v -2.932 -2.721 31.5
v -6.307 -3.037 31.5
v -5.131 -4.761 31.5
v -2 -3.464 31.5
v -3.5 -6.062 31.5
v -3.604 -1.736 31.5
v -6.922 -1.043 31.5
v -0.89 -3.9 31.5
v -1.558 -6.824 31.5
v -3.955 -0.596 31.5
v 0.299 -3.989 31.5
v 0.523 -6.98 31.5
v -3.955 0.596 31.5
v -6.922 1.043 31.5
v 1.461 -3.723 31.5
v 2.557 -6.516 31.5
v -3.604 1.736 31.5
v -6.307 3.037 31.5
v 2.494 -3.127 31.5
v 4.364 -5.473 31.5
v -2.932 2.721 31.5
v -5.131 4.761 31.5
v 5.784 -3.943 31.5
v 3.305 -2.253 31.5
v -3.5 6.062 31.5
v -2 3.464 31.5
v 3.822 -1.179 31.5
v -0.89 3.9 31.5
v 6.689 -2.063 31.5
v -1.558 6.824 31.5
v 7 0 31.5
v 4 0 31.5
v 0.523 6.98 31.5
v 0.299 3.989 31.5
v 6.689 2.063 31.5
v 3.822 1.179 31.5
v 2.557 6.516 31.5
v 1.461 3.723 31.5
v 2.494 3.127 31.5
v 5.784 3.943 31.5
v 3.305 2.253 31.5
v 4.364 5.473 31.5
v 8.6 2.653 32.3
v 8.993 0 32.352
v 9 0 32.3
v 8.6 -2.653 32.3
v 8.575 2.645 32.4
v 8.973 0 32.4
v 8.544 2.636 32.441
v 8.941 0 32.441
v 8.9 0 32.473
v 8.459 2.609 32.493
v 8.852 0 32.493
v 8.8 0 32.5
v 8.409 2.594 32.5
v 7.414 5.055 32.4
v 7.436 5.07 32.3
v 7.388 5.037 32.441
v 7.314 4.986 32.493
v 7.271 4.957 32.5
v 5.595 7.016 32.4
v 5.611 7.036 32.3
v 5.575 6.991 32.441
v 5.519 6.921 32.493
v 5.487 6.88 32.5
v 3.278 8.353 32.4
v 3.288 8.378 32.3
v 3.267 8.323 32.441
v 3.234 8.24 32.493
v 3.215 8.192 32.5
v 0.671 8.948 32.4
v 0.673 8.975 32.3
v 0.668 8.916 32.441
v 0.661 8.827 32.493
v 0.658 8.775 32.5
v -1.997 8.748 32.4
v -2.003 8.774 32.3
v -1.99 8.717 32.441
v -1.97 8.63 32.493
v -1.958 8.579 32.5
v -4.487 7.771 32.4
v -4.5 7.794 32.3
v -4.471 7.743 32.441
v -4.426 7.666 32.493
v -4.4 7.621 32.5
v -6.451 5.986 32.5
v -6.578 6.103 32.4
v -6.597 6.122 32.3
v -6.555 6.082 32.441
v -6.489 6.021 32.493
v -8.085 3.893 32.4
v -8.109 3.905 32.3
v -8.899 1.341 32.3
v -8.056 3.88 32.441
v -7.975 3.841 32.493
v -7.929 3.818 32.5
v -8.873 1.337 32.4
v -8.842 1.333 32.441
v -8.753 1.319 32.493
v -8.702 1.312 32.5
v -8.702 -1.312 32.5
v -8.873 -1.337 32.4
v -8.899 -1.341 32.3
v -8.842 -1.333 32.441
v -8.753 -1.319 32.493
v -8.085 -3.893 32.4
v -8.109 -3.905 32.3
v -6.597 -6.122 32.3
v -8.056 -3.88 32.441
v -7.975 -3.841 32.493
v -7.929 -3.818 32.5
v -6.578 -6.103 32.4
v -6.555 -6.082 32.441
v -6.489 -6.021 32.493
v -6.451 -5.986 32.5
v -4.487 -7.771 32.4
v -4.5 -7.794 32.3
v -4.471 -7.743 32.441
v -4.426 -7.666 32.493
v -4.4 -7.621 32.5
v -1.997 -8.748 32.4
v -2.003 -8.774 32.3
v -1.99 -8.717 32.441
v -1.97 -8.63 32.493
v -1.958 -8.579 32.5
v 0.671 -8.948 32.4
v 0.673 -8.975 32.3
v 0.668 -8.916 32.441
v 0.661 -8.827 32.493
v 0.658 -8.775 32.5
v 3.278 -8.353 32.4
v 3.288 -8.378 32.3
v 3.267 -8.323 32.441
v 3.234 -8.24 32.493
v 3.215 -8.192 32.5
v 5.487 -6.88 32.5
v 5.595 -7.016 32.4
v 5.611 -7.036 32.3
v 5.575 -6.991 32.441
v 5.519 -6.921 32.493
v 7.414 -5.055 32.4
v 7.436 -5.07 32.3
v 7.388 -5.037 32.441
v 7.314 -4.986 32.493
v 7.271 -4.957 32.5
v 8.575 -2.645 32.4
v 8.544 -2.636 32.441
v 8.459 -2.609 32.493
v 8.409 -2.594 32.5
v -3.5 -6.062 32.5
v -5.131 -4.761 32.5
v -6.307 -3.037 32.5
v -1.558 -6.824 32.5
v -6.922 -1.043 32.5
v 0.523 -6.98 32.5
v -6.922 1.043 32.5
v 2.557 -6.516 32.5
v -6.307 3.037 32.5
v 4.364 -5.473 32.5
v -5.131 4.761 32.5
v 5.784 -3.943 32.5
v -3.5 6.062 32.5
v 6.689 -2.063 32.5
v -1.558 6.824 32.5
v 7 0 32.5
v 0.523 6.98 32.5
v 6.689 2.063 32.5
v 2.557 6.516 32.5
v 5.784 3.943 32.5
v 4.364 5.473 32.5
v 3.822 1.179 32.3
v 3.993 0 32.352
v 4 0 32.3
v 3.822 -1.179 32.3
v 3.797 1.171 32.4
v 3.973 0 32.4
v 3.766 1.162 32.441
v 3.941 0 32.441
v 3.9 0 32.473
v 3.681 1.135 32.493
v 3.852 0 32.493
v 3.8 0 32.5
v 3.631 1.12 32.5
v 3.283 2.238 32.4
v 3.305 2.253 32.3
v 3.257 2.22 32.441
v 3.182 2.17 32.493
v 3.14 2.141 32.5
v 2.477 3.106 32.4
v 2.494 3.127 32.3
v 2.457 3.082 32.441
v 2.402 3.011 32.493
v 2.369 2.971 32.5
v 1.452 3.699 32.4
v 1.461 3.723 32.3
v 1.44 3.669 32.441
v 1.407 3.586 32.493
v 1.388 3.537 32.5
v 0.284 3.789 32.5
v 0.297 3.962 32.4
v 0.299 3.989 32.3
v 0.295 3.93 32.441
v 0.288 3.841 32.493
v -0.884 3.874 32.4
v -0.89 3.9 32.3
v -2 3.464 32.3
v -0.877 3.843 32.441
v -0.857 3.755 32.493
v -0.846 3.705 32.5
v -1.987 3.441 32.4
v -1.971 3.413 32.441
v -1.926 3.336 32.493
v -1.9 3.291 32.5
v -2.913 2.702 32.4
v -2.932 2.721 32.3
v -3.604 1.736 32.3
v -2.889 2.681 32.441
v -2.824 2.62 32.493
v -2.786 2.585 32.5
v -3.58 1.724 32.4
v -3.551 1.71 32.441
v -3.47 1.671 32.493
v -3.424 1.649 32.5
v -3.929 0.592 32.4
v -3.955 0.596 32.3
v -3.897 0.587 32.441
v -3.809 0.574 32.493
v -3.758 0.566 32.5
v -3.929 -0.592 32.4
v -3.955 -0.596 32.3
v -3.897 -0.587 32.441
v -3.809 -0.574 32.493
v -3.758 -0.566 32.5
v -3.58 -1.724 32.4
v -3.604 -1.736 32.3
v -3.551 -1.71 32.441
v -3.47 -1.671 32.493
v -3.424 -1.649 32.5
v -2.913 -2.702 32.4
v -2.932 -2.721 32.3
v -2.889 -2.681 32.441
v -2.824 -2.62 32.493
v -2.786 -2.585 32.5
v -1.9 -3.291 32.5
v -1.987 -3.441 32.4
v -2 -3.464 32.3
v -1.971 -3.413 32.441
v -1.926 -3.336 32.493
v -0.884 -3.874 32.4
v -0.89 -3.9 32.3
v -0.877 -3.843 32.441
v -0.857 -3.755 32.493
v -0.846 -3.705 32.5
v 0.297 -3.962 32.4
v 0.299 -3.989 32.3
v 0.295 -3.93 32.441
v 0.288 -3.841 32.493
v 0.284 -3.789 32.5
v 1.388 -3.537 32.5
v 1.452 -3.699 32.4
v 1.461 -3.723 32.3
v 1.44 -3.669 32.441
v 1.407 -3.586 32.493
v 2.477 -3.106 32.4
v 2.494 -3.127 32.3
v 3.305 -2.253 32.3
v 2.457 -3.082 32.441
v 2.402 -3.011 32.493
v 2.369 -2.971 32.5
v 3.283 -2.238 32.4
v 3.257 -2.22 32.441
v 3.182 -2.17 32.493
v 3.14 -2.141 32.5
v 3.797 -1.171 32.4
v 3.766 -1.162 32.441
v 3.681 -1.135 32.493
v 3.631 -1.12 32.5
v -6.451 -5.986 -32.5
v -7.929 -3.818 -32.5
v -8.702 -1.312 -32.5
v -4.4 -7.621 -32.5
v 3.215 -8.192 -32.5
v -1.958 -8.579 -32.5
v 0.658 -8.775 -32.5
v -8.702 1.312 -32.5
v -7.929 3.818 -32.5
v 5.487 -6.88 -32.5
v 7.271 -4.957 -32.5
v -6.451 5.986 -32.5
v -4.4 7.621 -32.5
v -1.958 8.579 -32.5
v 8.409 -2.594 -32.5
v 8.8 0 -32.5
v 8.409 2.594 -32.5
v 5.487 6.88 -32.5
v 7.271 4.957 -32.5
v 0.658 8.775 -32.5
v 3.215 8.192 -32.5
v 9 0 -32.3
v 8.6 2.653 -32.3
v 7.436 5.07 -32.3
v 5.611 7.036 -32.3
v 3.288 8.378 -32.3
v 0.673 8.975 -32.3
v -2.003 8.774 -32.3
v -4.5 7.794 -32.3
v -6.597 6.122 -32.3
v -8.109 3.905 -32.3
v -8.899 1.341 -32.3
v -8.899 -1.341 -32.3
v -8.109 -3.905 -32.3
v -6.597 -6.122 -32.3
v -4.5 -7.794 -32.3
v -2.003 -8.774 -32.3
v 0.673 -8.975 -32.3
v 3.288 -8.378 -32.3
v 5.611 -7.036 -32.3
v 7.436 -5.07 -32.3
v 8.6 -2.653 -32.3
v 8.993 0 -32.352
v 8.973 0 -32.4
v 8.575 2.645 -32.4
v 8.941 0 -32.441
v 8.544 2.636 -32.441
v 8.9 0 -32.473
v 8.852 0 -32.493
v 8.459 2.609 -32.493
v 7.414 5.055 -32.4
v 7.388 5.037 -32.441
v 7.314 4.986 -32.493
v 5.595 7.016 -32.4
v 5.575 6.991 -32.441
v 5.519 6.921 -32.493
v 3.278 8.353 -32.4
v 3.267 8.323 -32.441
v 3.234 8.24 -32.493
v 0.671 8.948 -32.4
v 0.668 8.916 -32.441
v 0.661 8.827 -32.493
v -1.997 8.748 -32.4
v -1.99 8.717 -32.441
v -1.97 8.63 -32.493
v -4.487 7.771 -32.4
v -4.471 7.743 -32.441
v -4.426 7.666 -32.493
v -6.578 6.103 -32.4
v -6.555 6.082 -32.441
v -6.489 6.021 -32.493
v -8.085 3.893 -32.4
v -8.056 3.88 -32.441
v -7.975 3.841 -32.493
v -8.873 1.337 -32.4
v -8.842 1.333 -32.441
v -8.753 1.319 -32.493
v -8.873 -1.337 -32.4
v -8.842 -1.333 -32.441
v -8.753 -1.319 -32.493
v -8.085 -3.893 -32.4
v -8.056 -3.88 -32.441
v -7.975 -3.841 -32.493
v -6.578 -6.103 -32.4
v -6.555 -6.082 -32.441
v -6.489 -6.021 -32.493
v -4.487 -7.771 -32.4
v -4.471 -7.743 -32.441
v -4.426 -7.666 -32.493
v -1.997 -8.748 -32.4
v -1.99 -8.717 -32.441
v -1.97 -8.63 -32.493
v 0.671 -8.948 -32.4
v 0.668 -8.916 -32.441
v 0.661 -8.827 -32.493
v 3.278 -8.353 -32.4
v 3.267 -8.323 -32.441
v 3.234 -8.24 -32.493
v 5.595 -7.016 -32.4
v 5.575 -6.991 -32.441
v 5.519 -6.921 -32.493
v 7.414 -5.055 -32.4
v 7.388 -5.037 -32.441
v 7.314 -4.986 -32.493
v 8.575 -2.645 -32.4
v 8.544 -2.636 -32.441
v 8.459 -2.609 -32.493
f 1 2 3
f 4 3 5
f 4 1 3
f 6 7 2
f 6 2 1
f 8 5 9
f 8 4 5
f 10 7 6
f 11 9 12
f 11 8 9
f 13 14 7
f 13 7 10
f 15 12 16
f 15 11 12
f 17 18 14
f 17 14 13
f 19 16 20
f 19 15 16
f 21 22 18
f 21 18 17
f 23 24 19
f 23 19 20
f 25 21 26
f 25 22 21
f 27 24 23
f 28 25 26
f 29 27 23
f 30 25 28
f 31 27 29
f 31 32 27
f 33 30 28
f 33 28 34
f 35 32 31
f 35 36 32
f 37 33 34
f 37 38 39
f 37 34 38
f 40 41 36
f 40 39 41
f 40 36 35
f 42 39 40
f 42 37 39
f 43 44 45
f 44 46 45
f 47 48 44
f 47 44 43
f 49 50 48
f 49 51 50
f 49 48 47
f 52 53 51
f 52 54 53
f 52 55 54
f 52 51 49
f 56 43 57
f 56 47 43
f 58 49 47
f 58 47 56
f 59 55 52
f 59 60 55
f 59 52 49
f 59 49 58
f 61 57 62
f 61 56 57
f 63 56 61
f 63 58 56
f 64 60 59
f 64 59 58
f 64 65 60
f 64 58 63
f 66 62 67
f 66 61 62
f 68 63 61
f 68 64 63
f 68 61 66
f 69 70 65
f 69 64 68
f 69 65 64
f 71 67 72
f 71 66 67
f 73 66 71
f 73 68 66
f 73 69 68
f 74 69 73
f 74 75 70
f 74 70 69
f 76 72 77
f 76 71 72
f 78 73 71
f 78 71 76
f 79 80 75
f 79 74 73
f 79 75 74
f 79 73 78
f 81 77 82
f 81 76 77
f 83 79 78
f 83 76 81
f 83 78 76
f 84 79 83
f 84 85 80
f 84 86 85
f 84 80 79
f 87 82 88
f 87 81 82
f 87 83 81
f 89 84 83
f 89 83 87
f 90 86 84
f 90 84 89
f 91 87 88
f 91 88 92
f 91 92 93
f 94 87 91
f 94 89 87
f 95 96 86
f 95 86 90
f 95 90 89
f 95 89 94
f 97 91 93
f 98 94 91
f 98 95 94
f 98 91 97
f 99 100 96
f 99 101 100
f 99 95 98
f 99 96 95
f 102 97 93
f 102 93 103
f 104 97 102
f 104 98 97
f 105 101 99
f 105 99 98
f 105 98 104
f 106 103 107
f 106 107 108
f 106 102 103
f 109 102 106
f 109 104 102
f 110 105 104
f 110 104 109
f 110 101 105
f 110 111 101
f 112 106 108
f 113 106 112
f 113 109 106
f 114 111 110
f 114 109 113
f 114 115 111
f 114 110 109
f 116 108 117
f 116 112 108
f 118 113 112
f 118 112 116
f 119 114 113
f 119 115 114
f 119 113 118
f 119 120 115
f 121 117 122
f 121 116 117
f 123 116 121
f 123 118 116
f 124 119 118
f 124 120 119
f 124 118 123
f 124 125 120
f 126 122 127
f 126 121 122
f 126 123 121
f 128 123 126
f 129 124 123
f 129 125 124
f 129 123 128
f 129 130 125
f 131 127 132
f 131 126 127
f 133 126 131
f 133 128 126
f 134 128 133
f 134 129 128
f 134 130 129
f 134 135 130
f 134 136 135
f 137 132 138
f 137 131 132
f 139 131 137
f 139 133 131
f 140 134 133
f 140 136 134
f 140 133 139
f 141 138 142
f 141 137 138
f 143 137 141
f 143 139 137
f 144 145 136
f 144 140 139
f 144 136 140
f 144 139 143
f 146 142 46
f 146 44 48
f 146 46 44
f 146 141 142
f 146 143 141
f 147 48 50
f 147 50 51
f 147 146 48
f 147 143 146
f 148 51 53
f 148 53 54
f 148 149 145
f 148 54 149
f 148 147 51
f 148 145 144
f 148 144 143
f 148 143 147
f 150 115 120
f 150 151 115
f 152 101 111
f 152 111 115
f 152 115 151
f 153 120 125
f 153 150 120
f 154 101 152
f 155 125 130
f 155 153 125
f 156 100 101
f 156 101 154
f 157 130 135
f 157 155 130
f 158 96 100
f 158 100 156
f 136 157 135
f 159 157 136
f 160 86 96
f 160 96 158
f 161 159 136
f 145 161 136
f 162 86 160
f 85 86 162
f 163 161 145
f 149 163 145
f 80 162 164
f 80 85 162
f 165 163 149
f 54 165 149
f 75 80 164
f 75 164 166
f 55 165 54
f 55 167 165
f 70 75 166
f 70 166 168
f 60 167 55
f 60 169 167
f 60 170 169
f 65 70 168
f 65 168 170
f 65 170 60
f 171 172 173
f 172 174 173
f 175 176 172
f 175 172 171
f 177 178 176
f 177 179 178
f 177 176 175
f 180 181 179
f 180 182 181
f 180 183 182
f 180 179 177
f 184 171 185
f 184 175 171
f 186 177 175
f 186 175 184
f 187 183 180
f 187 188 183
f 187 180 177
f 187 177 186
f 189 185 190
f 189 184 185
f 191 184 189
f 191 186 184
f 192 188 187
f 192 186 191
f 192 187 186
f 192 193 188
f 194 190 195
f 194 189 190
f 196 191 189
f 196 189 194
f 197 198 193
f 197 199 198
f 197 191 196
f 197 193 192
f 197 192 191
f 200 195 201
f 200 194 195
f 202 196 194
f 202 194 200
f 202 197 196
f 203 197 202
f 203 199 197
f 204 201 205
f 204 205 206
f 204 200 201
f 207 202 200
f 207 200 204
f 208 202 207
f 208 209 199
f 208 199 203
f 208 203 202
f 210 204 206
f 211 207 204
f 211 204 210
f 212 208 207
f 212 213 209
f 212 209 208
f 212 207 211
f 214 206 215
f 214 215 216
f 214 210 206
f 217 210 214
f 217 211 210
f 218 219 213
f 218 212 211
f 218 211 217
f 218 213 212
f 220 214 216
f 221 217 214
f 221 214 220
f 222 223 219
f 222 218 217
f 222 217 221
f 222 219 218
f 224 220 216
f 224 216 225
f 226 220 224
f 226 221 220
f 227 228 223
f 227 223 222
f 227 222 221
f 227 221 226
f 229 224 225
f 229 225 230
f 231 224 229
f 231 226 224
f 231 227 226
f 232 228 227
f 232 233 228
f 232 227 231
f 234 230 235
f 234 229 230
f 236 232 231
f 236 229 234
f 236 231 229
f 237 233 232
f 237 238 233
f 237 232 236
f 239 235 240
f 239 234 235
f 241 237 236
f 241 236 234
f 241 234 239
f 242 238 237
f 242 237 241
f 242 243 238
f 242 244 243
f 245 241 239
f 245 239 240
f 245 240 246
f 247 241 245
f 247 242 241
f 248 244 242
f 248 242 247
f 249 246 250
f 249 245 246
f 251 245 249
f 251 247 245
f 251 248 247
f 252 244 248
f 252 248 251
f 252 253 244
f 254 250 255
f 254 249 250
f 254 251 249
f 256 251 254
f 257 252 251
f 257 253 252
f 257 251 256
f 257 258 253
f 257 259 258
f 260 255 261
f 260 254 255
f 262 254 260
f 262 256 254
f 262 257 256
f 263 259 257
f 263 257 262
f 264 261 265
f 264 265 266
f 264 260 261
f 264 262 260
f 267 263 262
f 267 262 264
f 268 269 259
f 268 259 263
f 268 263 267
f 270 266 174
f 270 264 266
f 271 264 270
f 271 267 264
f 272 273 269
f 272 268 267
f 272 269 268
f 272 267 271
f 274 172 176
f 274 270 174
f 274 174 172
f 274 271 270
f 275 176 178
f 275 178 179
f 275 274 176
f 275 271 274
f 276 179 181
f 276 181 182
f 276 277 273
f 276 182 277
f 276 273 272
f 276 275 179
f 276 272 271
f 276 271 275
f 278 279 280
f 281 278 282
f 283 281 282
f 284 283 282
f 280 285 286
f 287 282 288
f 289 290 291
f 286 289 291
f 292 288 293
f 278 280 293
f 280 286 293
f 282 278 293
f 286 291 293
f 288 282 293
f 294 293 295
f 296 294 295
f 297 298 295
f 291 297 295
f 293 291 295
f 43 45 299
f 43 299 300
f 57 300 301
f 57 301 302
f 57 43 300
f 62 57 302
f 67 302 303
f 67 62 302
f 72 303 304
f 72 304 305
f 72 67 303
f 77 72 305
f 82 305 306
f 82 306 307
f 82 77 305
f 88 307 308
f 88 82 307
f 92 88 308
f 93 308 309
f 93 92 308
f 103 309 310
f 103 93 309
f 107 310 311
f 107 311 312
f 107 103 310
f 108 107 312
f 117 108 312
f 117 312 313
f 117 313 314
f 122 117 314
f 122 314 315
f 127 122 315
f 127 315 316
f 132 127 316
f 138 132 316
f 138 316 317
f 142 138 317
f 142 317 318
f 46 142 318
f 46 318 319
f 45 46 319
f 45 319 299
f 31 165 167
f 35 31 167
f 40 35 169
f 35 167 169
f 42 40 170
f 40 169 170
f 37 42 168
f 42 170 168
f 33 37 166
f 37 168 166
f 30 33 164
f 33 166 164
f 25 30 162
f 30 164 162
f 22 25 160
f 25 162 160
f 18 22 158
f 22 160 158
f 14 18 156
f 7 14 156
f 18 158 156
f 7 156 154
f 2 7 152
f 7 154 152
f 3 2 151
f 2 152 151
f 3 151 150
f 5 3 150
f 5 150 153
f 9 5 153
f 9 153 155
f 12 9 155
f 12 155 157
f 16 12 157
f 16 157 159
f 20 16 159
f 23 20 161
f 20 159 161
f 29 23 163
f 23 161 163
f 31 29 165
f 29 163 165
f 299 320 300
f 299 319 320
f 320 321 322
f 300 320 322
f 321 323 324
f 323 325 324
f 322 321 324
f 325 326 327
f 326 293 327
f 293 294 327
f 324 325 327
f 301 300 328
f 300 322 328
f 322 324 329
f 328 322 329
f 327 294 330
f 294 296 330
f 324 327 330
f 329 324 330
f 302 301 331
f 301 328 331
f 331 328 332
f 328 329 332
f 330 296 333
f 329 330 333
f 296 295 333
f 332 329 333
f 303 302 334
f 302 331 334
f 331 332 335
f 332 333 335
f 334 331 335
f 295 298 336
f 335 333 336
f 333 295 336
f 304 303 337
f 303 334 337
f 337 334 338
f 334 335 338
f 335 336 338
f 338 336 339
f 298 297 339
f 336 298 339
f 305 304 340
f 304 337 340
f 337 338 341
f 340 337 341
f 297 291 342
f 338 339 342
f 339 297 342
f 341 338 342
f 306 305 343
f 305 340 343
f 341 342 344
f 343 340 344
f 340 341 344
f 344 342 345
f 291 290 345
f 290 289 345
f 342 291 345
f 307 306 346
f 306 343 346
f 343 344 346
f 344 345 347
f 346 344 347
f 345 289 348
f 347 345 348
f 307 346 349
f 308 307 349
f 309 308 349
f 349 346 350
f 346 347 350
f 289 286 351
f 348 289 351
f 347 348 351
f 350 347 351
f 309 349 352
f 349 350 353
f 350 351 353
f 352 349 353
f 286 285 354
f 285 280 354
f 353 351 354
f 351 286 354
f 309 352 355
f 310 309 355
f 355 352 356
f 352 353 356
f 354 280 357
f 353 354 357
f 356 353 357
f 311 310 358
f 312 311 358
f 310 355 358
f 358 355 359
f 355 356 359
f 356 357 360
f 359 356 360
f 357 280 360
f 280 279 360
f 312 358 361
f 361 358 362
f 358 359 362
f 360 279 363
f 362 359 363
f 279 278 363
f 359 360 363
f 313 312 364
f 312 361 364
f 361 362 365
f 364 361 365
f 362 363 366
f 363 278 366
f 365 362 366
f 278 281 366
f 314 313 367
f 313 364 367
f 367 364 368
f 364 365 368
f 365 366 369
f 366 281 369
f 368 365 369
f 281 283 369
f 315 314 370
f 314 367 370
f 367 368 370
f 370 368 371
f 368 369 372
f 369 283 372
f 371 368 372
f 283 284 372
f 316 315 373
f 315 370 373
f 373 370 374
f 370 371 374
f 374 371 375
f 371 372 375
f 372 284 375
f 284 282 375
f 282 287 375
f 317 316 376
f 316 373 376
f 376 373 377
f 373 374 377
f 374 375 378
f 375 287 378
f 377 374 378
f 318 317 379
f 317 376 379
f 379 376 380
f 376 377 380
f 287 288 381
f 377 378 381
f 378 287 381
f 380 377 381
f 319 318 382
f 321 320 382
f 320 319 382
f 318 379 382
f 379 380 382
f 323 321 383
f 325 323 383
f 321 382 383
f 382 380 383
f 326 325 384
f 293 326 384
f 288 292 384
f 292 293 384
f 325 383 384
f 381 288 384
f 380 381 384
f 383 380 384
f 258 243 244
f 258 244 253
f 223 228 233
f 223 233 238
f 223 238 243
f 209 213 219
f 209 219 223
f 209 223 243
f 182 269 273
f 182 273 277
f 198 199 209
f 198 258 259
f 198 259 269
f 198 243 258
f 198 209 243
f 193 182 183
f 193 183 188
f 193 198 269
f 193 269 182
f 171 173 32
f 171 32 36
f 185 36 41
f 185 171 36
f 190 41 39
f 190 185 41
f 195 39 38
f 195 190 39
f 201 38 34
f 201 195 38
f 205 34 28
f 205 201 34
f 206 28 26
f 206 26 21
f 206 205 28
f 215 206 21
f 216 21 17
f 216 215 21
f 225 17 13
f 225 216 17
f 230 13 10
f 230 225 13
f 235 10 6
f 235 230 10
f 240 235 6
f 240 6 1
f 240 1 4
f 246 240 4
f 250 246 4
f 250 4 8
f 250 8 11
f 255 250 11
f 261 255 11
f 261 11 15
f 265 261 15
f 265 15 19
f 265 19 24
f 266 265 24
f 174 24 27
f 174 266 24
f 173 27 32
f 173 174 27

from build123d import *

# Parameters (mm, degrees)
SKETCH1_R           = 9
BOSS_EXTRUDE1_DEPTH = 32.5
SKETCH2_R           = 7
SKETCH2_R_2         = 4
CUT_EXTRUDE1_DEPTH  = 1
FILLET1_R           = 0.2


with BuildPart() as part:
    # Sketch1 → Boss-Extrude1 (new, symmetric)
    with BuildSketch(Plane.XY):
        Circle(SKETCH1_R)
    extrude(amount=BOSS_EXTRUDE1_DEPTH, both=True)

    # Sketch2 → Cut-Extrude1 (cut)
    with BuildSketch(Plane.XY.offset(32.5)):
        Circle(SKETCH2_R)
        Circle(SKETCH2_R_2, mode=Mode.SUBTRACT)
    extrude(amount=-CUT_EXTRUDE1_DEPTH, mode=Mode.SUBTRACT)

    # Fillet1
    fillet1_edges = [part.edges().sort_by_distance(p)[0] for p in [
        (-4, 0, 32.5),
        (-9, 0, -32.5),
        (-9, 0, 32.5),
    ]]
    fillet(fillet1_edges, radius=FILLET1_R)


solid = part.part
